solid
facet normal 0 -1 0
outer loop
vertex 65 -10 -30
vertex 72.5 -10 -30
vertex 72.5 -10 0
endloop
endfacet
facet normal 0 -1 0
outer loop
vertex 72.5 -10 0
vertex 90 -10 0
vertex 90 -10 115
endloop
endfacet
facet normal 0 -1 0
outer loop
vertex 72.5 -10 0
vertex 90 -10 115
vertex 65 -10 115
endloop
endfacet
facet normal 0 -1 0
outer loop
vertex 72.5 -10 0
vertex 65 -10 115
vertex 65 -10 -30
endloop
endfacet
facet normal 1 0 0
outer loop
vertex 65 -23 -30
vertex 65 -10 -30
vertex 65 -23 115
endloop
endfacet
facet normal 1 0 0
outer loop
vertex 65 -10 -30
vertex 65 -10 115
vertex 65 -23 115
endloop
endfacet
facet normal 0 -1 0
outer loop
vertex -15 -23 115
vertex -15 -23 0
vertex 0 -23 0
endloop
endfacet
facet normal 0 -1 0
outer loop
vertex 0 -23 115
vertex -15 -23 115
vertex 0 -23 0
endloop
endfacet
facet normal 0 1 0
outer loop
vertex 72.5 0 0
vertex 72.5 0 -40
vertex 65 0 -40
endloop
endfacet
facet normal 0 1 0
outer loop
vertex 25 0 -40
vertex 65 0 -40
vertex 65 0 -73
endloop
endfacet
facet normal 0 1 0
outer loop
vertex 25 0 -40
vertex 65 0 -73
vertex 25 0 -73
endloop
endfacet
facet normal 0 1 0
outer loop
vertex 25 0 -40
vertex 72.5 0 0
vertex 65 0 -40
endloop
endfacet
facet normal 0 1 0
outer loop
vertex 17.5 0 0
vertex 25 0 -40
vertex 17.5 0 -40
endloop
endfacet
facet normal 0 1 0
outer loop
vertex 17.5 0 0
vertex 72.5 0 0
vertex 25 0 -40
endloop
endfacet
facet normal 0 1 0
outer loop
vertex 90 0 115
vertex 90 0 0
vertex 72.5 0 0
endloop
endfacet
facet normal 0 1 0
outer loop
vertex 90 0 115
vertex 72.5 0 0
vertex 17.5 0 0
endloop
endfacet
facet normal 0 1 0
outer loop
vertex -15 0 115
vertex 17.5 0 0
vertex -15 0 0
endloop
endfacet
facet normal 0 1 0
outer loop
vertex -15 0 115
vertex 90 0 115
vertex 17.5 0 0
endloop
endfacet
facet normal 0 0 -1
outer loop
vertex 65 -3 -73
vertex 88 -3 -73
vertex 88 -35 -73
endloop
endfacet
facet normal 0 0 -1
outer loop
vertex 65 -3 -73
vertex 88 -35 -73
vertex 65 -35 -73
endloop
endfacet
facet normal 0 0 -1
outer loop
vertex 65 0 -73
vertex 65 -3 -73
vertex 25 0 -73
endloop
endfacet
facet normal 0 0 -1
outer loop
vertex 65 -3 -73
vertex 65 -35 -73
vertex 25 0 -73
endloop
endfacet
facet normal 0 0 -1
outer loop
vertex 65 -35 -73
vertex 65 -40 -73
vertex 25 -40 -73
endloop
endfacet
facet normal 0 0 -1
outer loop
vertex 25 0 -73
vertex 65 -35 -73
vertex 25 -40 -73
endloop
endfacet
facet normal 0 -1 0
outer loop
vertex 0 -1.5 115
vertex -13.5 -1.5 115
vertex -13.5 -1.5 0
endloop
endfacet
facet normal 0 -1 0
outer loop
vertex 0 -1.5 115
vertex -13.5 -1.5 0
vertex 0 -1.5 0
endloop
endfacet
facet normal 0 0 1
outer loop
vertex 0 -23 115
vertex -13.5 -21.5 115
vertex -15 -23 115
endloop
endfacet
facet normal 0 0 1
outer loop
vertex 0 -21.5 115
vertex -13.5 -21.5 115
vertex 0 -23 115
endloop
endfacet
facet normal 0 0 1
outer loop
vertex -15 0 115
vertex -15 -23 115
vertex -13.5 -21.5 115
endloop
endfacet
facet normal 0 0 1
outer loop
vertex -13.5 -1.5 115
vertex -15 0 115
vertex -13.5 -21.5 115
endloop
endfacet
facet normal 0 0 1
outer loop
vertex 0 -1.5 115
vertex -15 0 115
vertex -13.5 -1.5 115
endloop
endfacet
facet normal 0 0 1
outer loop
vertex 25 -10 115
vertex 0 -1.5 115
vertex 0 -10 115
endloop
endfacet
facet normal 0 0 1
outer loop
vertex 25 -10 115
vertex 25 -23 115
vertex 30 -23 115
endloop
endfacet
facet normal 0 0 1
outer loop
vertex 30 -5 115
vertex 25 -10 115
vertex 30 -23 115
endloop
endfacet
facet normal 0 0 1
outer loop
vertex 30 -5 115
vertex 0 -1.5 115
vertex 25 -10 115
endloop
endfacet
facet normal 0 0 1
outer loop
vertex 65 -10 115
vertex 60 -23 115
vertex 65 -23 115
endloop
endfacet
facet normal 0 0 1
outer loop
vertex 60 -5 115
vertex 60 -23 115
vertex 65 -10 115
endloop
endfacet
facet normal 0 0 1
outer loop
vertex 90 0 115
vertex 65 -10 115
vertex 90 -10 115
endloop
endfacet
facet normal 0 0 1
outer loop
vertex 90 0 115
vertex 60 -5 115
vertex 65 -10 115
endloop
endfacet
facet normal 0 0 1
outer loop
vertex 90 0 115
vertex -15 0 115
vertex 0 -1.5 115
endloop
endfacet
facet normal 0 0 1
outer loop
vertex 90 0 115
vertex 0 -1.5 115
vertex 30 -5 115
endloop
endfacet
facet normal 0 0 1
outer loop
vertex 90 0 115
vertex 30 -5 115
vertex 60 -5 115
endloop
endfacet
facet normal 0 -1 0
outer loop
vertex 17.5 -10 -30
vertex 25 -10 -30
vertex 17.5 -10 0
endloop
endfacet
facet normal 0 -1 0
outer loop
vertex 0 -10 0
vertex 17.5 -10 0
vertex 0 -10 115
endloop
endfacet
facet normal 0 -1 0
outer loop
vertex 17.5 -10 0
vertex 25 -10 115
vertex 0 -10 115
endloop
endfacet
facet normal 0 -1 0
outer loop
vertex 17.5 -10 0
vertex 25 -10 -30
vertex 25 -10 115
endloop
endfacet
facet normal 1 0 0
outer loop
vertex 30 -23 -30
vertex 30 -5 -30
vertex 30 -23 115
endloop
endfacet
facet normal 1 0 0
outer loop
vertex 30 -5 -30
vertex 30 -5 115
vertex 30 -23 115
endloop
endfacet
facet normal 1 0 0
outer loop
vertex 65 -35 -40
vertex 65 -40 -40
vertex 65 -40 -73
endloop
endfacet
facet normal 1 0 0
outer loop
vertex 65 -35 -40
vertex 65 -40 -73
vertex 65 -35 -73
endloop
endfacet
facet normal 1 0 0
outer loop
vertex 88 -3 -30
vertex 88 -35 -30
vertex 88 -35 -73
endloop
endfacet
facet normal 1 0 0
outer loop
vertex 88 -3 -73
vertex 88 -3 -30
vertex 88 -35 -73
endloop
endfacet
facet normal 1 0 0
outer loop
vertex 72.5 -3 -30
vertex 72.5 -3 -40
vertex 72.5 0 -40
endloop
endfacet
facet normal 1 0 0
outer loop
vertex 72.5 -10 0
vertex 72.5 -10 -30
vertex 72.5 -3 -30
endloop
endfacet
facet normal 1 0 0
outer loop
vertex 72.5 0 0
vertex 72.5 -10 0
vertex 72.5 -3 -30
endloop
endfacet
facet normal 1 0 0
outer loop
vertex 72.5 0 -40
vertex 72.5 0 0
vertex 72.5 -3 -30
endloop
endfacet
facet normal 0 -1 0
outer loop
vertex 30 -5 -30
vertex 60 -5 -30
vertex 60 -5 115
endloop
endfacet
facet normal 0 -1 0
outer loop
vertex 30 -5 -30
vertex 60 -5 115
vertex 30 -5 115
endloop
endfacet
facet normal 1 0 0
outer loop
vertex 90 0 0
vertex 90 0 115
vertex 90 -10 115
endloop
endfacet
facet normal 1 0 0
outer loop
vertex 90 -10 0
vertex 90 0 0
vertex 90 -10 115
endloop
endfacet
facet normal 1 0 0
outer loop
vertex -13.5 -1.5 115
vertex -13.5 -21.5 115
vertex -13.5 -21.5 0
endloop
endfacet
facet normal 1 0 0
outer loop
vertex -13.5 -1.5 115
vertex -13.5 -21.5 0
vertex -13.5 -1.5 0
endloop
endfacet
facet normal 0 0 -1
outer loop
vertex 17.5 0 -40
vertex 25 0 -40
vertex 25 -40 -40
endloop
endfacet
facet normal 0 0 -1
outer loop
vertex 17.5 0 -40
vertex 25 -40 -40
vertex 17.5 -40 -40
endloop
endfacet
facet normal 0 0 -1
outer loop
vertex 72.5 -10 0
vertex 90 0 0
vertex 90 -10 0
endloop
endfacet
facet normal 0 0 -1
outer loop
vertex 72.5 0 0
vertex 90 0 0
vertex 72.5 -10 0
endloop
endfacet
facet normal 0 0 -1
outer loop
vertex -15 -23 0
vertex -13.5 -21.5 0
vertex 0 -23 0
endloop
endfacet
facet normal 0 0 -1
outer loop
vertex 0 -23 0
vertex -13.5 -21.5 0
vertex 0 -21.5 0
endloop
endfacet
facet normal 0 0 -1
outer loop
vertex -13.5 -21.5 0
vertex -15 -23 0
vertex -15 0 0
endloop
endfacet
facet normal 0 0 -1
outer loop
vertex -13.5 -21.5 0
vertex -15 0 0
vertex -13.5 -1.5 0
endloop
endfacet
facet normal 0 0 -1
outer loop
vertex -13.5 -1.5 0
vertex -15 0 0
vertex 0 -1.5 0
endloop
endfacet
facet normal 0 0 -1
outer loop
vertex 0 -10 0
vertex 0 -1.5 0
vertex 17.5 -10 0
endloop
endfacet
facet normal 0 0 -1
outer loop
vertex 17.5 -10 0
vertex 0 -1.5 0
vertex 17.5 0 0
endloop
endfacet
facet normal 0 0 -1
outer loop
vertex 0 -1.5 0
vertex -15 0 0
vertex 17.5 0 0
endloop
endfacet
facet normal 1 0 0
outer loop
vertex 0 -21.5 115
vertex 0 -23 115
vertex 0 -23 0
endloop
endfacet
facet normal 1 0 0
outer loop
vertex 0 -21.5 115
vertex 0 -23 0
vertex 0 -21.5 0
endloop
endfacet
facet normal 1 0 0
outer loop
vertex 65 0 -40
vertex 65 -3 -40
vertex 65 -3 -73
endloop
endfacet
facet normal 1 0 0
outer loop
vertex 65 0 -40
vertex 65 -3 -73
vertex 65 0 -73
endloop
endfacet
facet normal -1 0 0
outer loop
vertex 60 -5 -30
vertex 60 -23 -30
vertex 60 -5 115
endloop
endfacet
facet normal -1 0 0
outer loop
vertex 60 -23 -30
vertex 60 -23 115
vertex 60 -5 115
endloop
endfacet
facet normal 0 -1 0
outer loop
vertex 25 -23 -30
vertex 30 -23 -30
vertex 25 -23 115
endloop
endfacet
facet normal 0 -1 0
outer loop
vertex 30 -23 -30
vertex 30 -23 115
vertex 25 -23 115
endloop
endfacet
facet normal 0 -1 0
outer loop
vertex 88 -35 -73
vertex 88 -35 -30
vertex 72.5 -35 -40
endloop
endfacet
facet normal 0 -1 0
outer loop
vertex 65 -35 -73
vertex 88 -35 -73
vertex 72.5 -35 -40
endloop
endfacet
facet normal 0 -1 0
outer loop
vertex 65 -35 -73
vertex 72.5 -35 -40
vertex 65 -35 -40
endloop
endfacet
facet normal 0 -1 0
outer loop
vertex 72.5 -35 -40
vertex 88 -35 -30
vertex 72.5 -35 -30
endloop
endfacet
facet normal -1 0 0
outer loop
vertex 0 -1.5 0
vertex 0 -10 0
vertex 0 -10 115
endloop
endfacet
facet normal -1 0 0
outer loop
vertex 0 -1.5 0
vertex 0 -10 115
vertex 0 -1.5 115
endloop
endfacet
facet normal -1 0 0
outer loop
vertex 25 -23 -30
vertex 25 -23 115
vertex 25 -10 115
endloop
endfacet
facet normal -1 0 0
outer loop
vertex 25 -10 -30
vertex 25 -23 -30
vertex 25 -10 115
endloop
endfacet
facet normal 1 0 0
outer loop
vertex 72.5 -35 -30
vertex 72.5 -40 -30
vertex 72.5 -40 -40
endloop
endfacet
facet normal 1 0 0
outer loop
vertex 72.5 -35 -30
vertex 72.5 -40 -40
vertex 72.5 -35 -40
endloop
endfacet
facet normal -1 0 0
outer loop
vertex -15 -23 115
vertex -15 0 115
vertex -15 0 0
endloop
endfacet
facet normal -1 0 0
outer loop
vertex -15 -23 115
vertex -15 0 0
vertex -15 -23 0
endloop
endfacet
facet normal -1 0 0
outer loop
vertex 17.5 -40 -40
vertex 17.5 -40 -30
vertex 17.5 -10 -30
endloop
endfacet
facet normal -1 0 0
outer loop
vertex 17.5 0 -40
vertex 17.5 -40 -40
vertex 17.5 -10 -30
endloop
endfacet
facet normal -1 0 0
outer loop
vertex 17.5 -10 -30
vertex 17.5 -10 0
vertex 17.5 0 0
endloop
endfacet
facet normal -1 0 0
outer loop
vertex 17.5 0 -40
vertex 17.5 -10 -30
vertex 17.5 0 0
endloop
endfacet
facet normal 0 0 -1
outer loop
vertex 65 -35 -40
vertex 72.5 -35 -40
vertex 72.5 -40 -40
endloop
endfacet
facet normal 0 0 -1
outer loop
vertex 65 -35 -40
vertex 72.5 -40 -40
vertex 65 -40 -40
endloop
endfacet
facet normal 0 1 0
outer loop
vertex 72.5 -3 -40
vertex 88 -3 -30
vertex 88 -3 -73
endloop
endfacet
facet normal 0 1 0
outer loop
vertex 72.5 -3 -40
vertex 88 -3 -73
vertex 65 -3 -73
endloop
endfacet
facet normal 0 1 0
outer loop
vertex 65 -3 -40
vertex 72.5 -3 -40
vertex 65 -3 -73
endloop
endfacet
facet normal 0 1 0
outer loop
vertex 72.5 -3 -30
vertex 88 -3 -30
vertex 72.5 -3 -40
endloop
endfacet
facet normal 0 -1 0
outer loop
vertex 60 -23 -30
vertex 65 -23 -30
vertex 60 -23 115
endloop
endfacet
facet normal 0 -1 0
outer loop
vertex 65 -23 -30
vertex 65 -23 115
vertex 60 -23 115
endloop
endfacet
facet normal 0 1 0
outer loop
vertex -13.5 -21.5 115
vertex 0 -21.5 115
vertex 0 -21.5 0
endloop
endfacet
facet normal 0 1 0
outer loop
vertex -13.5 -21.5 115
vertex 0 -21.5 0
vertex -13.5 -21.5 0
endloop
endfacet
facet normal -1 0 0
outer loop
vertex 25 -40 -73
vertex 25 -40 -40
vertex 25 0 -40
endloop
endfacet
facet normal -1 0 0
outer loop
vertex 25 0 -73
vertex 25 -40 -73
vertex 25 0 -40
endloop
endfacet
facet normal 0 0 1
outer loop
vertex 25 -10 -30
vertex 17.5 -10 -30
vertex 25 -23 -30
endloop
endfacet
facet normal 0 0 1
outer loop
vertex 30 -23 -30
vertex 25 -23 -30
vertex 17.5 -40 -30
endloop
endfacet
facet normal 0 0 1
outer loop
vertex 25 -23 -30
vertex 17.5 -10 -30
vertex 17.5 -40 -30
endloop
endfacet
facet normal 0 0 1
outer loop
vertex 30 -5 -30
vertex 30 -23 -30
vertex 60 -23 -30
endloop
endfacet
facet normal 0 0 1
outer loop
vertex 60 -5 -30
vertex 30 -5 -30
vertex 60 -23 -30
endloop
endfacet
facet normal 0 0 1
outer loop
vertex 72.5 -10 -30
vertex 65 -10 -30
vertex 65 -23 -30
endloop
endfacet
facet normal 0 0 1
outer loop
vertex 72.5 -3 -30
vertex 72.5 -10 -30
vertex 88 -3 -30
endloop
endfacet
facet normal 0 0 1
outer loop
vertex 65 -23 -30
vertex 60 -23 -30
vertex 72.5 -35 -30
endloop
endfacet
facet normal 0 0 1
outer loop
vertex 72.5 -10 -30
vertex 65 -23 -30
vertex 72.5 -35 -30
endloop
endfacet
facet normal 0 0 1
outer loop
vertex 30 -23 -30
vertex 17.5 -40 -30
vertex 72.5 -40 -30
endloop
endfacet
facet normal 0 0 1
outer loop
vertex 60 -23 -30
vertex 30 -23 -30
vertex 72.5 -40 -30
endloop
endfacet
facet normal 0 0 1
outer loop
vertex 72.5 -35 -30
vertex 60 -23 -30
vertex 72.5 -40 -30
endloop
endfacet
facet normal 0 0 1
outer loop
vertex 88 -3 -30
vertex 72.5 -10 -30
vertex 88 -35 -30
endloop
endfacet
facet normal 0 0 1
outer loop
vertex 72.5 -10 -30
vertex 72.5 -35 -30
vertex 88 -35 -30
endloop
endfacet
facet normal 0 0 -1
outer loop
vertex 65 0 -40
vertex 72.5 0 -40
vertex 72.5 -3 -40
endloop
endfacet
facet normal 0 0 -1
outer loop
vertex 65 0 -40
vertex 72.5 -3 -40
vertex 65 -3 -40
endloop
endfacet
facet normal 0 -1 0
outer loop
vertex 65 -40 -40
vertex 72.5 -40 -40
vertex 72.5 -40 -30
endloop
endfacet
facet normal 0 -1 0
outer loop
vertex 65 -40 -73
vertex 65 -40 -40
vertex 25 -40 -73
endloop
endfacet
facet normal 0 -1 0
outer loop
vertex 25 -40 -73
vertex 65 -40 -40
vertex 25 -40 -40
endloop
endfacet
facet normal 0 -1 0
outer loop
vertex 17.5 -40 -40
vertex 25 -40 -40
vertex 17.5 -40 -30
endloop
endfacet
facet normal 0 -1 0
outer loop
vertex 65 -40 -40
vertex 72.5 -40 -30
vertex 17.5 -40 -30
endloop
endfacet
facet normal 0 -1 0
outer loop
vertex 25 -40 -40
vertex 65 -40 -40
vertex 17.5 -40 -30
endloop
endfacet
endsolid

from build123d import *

# Parameters (mm, degrees)
BOSS_EXTRUDE1_DEPTH = 115
BOSS_EXTRUDE2_DEPTH = 30
SKETCH3_W           = 55
SKETCH3_H           = 40
BOSS_EXTRUDE3_DEPTH = 10
SKETCH4_W           = 40
SKETCH4_H           = 40
BOSS_EXTRUDE4_DEPTH = 33
BOSS_EXTRUDE5_START = -5
BOSS_EXTRUDE5_DEPTH = 32
BOSS_EXTRUDE6_DEPTH = 115


with BuildPart() as part:
    # Sketch1 → Boss-Extrude1 (new body)
    with BuildSketch(Plane.XY):
        Polygon((0, 0), (90, 0), (90, -10), (65, -10), (65, -23), (60, -23), (60, -5), (30, -5), (30, -23), (25, -23), (25, -10), (0, -10), align=None)
    extrude(amount=BOSS_EXTRUDE1_DEPTH)

    # Sketch2 → Boss-Extrude2 (add)
    with BuildSketch(Plane(origin=(0, 0, 0), x_dir=(-1, 0, 0), z_dir=(0, 0, -1))):
        Polygon((-17.5, -10), (-17.5, 0), (-72.5, 0), (-72.5, -10), (-65, -10), (-65, -23), (-60, -23), (-60, -5), (-30, -5), (-30, -23), (-25, -23), (-25, -10), align=None)
    extrude(amount=BOSS_EXTRUDE2_DEPTH)

    # Sketch3 → Boss-Extrude3 (add)
    with BuildSketch(Plane(origin=(0, 0, -30), x_dir=(-1, 0, 0), z_dir=(0, 0, -1))):
        with Locations((-45, -20)):
            Rectangle(SKETCH3_W, SKETCH3_H)
    extrude(amount=BOSS_EXTRUDE3_DEPTH)

    # Sketch4 → Boss-Extrude4 (add)
    with BuildSketch(Plane(origin=(0, 0, -40), x_dir=(-1, 0, 0), z_dir=(0, 0, -1))):
        with Locations((-45, -20)):
            Rectangle(SKETCH4_W, SKETCH4_H)
    extrude(amount=BOSS_EXTRUDE4_DEPTH)

    # Sketch5 → Boss-Extrude5 (add)
    with BuildSketch(Plane.XZ.offset(40).offset(BOSS_EXTRUDE5_START)):
        Polygon((65, -73), (65, -40), (72.5, -40), (72.5, -30), (88, -30), (88, -73), align=None)
    extrude(amount=-BOSS_EXTRUDE5_DEPTH)

    # Sketch7 → Boss-Extrude6 (add)
    with BuildSketch(Plane.XY.offset(115)):
        Polygon((0, 0), (-15, 0), (-15, -23), (0, -23), (0, -21.5), (-13.5, -21.5), (-13.5, -1.5), (0, -1.5), align=None)
    extrude(amount=-BOSS_EXTRUDE6_DEPTH)


solid = part.part
